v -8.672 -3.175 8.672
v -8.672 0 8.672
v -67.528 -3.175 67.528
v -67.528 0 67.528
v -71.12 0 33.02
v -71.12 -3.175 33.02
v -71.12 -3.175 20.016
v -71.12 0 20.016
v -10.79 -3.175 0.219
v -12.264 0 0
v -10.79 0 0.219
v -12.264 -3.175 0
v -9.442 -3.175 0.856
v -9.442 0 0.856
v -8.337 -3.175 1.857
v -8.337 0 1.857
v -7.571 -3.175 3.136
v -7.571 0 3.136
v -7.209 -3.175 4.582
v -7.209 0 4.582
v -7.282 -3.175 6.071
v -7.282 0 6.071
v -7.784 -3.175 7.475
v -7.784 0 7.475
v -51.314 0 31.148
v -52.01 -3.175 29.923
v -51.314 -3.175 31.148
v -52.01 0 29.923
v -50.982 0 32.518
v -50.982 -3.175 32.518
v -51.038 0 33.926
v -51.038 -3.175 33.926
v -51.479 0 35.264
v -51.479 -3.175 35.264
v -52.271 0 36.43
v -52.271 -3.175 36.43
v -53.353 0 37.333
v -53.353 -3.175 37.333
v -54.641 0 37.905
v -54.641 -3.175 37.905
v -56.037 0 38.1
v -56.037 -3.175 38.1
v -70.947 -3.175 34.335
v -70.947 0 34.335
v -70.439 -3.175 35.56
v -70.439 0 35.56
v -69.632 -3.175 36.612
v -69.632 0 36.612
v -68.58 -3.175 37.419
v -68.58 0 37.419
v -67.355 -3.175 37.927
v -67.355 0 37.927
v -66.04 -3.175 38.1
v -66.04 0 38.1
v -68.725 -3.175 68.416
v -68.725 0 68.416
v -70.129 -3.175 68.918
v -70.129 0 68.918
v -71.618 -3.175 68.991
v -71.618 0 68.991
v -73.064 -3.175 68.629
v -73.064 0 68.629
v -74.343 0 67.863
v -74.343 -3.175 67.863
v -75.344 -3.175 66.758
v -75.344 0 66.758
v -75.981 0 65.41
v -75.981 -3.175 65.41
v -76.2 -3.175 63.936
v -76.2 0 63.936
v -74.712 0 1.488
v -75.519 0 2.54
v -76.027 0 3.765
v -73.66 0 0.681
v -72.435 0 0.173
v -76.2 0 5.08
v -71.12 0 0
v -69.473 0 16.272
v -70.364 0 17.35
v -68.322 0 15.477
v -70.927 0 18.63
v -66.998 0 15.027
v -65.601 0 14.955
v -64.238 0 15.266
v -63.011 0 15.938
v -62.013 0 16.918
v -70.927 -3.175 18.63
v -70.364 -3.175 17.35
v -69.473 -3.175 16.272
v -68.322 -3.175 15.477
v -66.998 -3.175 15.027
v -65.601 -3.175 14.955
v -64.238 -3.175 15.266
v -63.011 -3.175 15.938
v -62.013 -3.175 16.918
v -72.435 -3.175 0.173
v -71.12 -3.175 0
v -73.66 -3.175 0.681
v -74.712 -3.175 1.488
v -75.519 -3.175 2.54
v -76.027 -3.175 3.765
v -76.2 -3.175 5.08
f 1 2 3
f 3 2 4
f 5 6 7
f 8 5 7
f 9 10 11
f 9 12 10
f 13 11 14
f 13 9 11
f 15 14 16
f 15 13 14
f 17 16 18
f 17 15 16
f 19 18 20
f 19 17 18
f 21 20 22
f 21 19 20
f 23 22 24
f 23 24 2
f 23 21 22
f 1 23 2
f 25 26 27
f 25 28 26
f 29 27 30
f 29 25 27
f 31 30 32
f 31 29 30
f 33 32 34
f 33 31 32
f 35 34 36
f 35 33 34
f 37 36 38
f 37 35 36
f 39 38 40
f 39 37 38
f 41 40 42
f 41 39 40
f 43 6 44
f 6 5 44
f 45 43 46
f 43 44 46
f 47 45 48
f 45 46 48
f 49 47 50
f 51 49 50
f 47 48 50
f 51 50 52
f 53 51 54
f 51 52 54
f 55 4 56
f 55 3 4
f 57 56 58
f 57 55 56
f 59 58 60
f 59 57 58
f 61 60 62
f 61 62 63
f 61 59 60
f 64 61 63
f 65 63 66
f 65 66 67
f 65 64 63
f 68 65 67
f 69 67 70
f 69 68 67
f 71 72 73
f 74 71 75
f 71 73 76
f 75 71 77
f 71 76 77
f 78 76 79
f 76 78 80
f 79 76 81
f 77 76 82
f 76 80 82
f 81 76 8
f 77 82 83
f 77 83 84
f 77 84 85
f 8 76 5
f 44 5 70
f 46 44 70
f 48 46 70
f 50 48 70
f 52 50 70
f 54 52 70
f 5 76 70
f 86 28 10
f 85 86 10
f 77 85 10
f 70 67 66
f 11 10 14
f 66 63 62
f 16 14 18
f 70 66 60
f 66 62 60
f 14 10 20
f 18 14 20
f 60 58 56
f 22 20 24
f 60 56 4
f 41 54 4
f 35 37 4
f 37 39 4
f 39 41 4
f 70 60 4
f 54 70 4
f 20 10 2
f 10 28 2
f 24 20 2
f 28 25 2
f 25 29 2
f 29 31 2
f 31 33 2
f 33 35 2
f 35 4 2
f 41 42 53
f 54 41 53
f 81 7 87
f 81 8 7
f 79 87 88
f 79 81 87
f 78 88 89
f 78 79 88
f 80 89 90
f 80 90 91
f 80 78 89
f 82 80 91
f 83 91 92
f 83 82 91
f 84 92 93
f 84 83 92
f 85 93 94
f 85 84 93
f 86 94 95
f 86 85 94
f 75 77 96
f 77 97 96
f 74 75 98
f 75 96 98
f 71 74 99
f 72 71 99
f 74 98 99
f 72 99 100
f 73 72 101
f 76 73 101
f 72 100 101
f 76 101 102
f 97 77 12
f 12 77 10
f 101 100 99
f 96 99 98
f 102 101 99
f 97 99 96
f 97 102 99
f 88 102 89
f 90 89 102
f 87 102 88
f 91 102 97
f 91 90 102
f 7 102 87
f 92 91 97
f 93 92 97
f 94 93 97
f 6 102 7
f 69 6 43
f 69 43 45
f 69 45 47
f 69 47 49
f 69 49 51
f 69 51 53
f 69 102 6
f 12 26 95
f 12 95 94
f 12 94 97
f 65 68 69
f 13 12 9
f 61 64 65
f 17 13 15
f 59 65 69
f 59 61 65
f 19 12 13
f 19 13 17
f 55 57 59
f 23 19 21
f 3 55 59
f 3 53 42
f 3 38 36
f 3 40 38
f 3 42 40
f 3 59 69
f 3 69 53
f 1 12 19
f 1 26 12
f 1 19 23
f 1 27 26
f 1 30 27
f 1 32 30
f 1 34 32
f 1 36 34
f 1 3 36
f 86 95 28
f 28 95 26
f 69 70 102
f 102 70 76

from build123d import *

# Parameters (mm, degrees)
F1_DEPTH = 3.175
F2_R     = 5.08
F4_DEPTH = 25.4
F5_R     = 5.08


with BuildPart() as f1:
    # F0 (on Front) → F1 (new body)
    with BuildSketch(Plane.XZ):
        Polygon((-76.2, 0), (0, 0), (-76.2, 76.2), align=None)
    extrude(amount=F1_DEPTH)

    # F2
    f2_edges = [f1.edges().sort_by_distance(p)[0] for p in [
        (-76.2, -1.5875, 76.2),
        (-76.2, -1.5875, 0),
        (0, -1.5875, 0),
    ]]
    fillet(f2_edges, radius=F2_R)

    # F3 (on face) → F4 (cut)
    with BuildSketch(Plane.XZ.offset(3.175)):
        Polygon((-71.12, 38.1), (-71.12, 5.08), (-45.72, 38.1), align=None)
    extrude(amount=-F4_DEPTH, mode=Mode.SUBTRACT)

    # F5
    f5_edges = [f1.edges().sort_by_distance(p)[0] for p in [
        (-71.12, -1.5875, 5.08),
        (-45.72, -1.5875, 38.1),
        (-71.12, -1.5875, 38.1),
    ]]
    fillet(f5_edges, radius=F5_R)


solid = f1.part
